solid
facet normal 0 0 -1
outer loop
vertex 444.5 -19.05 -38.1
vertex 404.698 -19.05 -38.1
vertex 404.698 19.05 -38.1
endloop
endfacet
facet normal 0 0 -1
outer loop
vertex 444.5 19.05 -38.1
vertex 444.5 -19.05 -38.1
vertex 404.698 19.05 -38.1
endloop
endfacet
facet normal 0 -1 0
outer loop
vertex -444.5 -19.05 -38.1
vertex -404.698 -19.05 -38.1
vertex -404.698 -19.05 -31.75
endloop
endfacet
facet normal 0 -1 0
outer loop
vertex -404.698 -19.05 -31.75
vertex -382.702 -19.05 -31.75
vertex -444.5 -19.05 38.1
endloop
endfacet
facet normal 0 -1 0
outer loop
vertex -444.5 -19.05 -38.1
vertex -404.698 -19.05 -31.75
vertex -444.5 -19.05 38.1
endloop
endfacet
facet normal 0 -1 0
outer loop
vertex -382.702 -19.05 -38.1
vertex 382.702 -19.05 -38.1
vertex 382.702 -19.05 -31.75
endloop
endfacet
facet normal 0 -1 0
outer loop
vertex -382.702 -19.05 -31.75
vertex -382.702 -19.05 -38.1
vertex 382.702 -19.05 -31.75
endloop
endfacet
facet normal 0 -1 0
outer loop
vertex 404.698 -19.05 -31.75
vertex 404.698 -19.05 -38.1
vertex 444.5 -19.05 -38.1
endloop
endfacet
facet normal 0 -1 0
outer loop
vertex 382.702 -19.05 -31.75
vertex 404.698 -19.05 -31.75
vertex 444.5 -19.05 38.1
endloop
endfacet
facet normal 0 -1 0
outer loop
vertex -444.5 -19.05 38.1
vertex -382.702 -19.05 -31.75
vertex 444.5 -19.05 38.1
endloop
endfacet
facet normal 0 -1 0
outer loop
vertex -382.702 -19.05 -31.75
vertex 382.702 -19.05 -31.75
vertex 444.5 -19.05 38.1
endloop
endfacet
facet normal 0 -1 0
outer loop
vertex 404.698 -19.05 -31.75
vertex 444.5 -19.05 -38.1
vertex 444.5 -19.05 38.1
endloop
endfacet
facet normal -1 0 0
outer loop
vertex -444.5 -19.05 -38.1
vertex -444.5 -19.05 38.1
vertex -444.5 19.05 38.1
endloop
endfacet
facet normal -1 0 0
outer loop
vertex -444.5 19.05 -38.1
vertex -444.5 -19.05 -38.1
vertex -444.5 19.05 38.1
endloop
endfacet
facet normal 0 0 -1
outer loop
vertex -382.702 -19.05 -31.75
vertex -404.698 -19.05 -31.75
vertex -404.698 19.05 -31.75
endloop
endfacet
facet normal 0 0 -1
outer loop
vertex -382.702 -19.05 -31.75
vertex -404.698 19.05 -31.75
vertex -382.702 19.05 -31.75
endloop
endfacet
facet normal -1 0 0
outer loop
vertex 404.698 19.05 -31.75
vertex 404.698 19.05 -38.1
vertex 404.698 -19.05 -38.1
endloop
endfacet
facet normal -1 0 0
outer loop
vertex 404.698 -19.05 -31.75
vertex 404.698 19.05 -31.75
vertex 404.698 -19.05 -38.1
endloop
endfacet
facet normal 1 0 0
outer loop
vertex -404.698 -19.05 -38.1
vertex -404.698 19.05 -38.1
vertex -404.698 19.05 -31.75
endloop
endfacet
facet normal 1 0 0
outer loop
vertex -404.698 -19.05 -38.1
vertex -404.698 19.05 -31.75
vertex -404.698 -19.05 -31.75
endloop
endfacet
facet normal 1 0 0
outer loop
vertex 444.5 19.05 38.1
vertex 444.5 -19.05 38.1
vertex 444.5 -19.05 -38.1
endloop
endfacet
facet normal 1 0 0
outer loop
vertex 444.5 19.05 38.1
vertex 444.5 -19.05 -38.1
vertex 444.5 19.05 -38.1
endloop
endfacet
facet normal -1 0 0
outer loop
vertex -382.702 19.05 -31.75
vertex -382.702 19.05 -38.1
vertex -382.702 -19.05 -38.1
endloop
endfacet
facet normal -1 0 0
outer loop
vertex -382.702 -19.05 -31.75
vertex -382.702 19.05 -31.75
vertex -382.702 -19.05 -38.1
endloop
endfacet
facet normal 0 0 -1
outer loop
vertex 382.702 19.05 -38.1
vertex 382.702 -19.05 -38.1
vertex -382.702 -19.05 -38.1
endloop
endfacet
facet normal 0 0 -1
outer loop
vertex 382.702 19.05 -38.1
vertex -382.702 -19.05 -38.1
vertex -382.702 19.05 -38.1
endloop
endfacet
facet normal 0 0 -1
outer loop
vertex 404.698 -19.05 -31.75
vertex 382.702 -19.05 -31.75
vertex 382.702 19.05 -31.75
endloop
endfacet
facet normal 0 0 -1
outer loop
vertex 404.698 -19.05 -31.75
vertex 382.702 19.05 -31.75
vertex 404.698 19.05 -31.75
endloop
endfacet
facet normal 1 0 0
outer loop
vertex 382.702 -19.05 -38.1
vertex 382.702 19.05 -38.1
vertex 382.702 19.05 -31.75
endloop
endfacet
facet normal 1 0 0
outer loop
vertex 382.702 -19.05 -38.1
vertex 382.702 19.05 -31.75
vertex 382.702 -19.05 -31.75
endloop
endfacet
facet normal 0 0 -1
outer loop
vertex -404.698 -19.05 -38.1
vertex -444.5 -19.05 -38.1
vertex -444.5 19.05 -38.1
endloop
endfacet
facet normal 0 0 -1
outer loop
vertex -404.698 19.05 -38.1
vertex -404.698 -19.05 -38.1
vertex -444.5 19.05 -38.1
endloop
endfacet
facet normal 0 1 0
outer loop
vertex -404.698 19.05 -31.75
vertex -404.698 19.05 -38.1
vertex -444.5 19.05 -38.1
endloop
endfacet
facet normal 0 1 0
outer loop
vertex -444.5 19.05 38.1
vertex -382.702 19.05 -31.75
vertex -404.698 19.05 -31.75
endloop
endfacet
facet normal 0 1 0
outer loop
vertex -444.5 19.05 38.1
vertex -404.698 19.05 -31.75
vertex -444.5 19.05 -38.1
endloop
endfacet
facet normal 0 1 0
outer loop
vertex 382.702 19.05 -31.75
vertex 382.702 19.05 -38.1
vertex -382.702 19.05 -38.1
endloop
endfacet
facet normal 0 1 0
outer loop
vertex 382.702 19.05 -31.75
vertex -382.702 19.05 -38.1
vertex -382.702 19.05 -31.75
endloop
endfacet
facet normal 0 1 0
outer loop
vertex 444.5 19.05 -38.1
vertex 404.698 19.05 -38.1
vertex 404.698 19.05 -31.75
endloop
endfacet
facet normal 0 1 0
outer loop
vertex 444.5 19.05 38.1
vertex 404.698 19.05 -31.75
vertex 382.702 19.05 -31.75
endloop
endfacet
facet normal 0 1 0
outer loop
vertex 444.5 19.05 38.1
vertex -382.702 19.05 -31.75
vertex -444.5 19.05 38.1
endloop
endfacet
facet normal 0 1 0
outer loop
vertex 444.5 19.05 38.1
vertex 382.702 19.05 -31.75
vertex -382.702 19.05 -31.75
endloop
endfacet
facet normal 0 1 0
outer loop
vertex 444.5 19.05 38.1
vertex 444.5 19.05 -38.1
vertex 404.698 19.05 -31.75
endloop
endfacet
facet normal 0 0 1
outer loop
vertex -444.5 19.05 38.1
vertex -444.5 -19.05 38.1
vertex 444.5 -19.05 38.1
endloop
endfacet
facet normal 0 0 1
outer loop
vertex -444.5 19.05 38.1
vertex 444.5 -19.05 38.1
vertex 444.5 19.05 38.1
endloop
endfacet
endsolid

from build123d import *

# Parameters (mm, degrees)
F0_W     = 38.1
F0_H     = 76.2
F1_DEPTH = 444.5
F2_W     = 21.9964
F2_H     = 38.1
F3_DEPTH = 6.35


with BuildPart() as f1:
    # F0 (on Right) → F1 (new body, symmetric)
    with BuildSketch(Plane.YZ):
        Rectangle(F0_W, F0_H)
    extrude(amount=F1_DEPTH, both=True)

    # F2 (on face) → F3 (cut)
    with BuildSketch(Plane(origin=(0, 0, -38.1), x_dir=(1, 0, 0), z_dir=(0, 0, -1))):
        with Locations((393.7, 0)):
            Rectangle(F2_W, F2_H)
        with Locations((-393.7, 0)):
            Rectangle(F2_W, F2_H)
    extrude(amount=-F3_DEPTH, mode=Mode.SUBTRACT)


solid = f1.part
